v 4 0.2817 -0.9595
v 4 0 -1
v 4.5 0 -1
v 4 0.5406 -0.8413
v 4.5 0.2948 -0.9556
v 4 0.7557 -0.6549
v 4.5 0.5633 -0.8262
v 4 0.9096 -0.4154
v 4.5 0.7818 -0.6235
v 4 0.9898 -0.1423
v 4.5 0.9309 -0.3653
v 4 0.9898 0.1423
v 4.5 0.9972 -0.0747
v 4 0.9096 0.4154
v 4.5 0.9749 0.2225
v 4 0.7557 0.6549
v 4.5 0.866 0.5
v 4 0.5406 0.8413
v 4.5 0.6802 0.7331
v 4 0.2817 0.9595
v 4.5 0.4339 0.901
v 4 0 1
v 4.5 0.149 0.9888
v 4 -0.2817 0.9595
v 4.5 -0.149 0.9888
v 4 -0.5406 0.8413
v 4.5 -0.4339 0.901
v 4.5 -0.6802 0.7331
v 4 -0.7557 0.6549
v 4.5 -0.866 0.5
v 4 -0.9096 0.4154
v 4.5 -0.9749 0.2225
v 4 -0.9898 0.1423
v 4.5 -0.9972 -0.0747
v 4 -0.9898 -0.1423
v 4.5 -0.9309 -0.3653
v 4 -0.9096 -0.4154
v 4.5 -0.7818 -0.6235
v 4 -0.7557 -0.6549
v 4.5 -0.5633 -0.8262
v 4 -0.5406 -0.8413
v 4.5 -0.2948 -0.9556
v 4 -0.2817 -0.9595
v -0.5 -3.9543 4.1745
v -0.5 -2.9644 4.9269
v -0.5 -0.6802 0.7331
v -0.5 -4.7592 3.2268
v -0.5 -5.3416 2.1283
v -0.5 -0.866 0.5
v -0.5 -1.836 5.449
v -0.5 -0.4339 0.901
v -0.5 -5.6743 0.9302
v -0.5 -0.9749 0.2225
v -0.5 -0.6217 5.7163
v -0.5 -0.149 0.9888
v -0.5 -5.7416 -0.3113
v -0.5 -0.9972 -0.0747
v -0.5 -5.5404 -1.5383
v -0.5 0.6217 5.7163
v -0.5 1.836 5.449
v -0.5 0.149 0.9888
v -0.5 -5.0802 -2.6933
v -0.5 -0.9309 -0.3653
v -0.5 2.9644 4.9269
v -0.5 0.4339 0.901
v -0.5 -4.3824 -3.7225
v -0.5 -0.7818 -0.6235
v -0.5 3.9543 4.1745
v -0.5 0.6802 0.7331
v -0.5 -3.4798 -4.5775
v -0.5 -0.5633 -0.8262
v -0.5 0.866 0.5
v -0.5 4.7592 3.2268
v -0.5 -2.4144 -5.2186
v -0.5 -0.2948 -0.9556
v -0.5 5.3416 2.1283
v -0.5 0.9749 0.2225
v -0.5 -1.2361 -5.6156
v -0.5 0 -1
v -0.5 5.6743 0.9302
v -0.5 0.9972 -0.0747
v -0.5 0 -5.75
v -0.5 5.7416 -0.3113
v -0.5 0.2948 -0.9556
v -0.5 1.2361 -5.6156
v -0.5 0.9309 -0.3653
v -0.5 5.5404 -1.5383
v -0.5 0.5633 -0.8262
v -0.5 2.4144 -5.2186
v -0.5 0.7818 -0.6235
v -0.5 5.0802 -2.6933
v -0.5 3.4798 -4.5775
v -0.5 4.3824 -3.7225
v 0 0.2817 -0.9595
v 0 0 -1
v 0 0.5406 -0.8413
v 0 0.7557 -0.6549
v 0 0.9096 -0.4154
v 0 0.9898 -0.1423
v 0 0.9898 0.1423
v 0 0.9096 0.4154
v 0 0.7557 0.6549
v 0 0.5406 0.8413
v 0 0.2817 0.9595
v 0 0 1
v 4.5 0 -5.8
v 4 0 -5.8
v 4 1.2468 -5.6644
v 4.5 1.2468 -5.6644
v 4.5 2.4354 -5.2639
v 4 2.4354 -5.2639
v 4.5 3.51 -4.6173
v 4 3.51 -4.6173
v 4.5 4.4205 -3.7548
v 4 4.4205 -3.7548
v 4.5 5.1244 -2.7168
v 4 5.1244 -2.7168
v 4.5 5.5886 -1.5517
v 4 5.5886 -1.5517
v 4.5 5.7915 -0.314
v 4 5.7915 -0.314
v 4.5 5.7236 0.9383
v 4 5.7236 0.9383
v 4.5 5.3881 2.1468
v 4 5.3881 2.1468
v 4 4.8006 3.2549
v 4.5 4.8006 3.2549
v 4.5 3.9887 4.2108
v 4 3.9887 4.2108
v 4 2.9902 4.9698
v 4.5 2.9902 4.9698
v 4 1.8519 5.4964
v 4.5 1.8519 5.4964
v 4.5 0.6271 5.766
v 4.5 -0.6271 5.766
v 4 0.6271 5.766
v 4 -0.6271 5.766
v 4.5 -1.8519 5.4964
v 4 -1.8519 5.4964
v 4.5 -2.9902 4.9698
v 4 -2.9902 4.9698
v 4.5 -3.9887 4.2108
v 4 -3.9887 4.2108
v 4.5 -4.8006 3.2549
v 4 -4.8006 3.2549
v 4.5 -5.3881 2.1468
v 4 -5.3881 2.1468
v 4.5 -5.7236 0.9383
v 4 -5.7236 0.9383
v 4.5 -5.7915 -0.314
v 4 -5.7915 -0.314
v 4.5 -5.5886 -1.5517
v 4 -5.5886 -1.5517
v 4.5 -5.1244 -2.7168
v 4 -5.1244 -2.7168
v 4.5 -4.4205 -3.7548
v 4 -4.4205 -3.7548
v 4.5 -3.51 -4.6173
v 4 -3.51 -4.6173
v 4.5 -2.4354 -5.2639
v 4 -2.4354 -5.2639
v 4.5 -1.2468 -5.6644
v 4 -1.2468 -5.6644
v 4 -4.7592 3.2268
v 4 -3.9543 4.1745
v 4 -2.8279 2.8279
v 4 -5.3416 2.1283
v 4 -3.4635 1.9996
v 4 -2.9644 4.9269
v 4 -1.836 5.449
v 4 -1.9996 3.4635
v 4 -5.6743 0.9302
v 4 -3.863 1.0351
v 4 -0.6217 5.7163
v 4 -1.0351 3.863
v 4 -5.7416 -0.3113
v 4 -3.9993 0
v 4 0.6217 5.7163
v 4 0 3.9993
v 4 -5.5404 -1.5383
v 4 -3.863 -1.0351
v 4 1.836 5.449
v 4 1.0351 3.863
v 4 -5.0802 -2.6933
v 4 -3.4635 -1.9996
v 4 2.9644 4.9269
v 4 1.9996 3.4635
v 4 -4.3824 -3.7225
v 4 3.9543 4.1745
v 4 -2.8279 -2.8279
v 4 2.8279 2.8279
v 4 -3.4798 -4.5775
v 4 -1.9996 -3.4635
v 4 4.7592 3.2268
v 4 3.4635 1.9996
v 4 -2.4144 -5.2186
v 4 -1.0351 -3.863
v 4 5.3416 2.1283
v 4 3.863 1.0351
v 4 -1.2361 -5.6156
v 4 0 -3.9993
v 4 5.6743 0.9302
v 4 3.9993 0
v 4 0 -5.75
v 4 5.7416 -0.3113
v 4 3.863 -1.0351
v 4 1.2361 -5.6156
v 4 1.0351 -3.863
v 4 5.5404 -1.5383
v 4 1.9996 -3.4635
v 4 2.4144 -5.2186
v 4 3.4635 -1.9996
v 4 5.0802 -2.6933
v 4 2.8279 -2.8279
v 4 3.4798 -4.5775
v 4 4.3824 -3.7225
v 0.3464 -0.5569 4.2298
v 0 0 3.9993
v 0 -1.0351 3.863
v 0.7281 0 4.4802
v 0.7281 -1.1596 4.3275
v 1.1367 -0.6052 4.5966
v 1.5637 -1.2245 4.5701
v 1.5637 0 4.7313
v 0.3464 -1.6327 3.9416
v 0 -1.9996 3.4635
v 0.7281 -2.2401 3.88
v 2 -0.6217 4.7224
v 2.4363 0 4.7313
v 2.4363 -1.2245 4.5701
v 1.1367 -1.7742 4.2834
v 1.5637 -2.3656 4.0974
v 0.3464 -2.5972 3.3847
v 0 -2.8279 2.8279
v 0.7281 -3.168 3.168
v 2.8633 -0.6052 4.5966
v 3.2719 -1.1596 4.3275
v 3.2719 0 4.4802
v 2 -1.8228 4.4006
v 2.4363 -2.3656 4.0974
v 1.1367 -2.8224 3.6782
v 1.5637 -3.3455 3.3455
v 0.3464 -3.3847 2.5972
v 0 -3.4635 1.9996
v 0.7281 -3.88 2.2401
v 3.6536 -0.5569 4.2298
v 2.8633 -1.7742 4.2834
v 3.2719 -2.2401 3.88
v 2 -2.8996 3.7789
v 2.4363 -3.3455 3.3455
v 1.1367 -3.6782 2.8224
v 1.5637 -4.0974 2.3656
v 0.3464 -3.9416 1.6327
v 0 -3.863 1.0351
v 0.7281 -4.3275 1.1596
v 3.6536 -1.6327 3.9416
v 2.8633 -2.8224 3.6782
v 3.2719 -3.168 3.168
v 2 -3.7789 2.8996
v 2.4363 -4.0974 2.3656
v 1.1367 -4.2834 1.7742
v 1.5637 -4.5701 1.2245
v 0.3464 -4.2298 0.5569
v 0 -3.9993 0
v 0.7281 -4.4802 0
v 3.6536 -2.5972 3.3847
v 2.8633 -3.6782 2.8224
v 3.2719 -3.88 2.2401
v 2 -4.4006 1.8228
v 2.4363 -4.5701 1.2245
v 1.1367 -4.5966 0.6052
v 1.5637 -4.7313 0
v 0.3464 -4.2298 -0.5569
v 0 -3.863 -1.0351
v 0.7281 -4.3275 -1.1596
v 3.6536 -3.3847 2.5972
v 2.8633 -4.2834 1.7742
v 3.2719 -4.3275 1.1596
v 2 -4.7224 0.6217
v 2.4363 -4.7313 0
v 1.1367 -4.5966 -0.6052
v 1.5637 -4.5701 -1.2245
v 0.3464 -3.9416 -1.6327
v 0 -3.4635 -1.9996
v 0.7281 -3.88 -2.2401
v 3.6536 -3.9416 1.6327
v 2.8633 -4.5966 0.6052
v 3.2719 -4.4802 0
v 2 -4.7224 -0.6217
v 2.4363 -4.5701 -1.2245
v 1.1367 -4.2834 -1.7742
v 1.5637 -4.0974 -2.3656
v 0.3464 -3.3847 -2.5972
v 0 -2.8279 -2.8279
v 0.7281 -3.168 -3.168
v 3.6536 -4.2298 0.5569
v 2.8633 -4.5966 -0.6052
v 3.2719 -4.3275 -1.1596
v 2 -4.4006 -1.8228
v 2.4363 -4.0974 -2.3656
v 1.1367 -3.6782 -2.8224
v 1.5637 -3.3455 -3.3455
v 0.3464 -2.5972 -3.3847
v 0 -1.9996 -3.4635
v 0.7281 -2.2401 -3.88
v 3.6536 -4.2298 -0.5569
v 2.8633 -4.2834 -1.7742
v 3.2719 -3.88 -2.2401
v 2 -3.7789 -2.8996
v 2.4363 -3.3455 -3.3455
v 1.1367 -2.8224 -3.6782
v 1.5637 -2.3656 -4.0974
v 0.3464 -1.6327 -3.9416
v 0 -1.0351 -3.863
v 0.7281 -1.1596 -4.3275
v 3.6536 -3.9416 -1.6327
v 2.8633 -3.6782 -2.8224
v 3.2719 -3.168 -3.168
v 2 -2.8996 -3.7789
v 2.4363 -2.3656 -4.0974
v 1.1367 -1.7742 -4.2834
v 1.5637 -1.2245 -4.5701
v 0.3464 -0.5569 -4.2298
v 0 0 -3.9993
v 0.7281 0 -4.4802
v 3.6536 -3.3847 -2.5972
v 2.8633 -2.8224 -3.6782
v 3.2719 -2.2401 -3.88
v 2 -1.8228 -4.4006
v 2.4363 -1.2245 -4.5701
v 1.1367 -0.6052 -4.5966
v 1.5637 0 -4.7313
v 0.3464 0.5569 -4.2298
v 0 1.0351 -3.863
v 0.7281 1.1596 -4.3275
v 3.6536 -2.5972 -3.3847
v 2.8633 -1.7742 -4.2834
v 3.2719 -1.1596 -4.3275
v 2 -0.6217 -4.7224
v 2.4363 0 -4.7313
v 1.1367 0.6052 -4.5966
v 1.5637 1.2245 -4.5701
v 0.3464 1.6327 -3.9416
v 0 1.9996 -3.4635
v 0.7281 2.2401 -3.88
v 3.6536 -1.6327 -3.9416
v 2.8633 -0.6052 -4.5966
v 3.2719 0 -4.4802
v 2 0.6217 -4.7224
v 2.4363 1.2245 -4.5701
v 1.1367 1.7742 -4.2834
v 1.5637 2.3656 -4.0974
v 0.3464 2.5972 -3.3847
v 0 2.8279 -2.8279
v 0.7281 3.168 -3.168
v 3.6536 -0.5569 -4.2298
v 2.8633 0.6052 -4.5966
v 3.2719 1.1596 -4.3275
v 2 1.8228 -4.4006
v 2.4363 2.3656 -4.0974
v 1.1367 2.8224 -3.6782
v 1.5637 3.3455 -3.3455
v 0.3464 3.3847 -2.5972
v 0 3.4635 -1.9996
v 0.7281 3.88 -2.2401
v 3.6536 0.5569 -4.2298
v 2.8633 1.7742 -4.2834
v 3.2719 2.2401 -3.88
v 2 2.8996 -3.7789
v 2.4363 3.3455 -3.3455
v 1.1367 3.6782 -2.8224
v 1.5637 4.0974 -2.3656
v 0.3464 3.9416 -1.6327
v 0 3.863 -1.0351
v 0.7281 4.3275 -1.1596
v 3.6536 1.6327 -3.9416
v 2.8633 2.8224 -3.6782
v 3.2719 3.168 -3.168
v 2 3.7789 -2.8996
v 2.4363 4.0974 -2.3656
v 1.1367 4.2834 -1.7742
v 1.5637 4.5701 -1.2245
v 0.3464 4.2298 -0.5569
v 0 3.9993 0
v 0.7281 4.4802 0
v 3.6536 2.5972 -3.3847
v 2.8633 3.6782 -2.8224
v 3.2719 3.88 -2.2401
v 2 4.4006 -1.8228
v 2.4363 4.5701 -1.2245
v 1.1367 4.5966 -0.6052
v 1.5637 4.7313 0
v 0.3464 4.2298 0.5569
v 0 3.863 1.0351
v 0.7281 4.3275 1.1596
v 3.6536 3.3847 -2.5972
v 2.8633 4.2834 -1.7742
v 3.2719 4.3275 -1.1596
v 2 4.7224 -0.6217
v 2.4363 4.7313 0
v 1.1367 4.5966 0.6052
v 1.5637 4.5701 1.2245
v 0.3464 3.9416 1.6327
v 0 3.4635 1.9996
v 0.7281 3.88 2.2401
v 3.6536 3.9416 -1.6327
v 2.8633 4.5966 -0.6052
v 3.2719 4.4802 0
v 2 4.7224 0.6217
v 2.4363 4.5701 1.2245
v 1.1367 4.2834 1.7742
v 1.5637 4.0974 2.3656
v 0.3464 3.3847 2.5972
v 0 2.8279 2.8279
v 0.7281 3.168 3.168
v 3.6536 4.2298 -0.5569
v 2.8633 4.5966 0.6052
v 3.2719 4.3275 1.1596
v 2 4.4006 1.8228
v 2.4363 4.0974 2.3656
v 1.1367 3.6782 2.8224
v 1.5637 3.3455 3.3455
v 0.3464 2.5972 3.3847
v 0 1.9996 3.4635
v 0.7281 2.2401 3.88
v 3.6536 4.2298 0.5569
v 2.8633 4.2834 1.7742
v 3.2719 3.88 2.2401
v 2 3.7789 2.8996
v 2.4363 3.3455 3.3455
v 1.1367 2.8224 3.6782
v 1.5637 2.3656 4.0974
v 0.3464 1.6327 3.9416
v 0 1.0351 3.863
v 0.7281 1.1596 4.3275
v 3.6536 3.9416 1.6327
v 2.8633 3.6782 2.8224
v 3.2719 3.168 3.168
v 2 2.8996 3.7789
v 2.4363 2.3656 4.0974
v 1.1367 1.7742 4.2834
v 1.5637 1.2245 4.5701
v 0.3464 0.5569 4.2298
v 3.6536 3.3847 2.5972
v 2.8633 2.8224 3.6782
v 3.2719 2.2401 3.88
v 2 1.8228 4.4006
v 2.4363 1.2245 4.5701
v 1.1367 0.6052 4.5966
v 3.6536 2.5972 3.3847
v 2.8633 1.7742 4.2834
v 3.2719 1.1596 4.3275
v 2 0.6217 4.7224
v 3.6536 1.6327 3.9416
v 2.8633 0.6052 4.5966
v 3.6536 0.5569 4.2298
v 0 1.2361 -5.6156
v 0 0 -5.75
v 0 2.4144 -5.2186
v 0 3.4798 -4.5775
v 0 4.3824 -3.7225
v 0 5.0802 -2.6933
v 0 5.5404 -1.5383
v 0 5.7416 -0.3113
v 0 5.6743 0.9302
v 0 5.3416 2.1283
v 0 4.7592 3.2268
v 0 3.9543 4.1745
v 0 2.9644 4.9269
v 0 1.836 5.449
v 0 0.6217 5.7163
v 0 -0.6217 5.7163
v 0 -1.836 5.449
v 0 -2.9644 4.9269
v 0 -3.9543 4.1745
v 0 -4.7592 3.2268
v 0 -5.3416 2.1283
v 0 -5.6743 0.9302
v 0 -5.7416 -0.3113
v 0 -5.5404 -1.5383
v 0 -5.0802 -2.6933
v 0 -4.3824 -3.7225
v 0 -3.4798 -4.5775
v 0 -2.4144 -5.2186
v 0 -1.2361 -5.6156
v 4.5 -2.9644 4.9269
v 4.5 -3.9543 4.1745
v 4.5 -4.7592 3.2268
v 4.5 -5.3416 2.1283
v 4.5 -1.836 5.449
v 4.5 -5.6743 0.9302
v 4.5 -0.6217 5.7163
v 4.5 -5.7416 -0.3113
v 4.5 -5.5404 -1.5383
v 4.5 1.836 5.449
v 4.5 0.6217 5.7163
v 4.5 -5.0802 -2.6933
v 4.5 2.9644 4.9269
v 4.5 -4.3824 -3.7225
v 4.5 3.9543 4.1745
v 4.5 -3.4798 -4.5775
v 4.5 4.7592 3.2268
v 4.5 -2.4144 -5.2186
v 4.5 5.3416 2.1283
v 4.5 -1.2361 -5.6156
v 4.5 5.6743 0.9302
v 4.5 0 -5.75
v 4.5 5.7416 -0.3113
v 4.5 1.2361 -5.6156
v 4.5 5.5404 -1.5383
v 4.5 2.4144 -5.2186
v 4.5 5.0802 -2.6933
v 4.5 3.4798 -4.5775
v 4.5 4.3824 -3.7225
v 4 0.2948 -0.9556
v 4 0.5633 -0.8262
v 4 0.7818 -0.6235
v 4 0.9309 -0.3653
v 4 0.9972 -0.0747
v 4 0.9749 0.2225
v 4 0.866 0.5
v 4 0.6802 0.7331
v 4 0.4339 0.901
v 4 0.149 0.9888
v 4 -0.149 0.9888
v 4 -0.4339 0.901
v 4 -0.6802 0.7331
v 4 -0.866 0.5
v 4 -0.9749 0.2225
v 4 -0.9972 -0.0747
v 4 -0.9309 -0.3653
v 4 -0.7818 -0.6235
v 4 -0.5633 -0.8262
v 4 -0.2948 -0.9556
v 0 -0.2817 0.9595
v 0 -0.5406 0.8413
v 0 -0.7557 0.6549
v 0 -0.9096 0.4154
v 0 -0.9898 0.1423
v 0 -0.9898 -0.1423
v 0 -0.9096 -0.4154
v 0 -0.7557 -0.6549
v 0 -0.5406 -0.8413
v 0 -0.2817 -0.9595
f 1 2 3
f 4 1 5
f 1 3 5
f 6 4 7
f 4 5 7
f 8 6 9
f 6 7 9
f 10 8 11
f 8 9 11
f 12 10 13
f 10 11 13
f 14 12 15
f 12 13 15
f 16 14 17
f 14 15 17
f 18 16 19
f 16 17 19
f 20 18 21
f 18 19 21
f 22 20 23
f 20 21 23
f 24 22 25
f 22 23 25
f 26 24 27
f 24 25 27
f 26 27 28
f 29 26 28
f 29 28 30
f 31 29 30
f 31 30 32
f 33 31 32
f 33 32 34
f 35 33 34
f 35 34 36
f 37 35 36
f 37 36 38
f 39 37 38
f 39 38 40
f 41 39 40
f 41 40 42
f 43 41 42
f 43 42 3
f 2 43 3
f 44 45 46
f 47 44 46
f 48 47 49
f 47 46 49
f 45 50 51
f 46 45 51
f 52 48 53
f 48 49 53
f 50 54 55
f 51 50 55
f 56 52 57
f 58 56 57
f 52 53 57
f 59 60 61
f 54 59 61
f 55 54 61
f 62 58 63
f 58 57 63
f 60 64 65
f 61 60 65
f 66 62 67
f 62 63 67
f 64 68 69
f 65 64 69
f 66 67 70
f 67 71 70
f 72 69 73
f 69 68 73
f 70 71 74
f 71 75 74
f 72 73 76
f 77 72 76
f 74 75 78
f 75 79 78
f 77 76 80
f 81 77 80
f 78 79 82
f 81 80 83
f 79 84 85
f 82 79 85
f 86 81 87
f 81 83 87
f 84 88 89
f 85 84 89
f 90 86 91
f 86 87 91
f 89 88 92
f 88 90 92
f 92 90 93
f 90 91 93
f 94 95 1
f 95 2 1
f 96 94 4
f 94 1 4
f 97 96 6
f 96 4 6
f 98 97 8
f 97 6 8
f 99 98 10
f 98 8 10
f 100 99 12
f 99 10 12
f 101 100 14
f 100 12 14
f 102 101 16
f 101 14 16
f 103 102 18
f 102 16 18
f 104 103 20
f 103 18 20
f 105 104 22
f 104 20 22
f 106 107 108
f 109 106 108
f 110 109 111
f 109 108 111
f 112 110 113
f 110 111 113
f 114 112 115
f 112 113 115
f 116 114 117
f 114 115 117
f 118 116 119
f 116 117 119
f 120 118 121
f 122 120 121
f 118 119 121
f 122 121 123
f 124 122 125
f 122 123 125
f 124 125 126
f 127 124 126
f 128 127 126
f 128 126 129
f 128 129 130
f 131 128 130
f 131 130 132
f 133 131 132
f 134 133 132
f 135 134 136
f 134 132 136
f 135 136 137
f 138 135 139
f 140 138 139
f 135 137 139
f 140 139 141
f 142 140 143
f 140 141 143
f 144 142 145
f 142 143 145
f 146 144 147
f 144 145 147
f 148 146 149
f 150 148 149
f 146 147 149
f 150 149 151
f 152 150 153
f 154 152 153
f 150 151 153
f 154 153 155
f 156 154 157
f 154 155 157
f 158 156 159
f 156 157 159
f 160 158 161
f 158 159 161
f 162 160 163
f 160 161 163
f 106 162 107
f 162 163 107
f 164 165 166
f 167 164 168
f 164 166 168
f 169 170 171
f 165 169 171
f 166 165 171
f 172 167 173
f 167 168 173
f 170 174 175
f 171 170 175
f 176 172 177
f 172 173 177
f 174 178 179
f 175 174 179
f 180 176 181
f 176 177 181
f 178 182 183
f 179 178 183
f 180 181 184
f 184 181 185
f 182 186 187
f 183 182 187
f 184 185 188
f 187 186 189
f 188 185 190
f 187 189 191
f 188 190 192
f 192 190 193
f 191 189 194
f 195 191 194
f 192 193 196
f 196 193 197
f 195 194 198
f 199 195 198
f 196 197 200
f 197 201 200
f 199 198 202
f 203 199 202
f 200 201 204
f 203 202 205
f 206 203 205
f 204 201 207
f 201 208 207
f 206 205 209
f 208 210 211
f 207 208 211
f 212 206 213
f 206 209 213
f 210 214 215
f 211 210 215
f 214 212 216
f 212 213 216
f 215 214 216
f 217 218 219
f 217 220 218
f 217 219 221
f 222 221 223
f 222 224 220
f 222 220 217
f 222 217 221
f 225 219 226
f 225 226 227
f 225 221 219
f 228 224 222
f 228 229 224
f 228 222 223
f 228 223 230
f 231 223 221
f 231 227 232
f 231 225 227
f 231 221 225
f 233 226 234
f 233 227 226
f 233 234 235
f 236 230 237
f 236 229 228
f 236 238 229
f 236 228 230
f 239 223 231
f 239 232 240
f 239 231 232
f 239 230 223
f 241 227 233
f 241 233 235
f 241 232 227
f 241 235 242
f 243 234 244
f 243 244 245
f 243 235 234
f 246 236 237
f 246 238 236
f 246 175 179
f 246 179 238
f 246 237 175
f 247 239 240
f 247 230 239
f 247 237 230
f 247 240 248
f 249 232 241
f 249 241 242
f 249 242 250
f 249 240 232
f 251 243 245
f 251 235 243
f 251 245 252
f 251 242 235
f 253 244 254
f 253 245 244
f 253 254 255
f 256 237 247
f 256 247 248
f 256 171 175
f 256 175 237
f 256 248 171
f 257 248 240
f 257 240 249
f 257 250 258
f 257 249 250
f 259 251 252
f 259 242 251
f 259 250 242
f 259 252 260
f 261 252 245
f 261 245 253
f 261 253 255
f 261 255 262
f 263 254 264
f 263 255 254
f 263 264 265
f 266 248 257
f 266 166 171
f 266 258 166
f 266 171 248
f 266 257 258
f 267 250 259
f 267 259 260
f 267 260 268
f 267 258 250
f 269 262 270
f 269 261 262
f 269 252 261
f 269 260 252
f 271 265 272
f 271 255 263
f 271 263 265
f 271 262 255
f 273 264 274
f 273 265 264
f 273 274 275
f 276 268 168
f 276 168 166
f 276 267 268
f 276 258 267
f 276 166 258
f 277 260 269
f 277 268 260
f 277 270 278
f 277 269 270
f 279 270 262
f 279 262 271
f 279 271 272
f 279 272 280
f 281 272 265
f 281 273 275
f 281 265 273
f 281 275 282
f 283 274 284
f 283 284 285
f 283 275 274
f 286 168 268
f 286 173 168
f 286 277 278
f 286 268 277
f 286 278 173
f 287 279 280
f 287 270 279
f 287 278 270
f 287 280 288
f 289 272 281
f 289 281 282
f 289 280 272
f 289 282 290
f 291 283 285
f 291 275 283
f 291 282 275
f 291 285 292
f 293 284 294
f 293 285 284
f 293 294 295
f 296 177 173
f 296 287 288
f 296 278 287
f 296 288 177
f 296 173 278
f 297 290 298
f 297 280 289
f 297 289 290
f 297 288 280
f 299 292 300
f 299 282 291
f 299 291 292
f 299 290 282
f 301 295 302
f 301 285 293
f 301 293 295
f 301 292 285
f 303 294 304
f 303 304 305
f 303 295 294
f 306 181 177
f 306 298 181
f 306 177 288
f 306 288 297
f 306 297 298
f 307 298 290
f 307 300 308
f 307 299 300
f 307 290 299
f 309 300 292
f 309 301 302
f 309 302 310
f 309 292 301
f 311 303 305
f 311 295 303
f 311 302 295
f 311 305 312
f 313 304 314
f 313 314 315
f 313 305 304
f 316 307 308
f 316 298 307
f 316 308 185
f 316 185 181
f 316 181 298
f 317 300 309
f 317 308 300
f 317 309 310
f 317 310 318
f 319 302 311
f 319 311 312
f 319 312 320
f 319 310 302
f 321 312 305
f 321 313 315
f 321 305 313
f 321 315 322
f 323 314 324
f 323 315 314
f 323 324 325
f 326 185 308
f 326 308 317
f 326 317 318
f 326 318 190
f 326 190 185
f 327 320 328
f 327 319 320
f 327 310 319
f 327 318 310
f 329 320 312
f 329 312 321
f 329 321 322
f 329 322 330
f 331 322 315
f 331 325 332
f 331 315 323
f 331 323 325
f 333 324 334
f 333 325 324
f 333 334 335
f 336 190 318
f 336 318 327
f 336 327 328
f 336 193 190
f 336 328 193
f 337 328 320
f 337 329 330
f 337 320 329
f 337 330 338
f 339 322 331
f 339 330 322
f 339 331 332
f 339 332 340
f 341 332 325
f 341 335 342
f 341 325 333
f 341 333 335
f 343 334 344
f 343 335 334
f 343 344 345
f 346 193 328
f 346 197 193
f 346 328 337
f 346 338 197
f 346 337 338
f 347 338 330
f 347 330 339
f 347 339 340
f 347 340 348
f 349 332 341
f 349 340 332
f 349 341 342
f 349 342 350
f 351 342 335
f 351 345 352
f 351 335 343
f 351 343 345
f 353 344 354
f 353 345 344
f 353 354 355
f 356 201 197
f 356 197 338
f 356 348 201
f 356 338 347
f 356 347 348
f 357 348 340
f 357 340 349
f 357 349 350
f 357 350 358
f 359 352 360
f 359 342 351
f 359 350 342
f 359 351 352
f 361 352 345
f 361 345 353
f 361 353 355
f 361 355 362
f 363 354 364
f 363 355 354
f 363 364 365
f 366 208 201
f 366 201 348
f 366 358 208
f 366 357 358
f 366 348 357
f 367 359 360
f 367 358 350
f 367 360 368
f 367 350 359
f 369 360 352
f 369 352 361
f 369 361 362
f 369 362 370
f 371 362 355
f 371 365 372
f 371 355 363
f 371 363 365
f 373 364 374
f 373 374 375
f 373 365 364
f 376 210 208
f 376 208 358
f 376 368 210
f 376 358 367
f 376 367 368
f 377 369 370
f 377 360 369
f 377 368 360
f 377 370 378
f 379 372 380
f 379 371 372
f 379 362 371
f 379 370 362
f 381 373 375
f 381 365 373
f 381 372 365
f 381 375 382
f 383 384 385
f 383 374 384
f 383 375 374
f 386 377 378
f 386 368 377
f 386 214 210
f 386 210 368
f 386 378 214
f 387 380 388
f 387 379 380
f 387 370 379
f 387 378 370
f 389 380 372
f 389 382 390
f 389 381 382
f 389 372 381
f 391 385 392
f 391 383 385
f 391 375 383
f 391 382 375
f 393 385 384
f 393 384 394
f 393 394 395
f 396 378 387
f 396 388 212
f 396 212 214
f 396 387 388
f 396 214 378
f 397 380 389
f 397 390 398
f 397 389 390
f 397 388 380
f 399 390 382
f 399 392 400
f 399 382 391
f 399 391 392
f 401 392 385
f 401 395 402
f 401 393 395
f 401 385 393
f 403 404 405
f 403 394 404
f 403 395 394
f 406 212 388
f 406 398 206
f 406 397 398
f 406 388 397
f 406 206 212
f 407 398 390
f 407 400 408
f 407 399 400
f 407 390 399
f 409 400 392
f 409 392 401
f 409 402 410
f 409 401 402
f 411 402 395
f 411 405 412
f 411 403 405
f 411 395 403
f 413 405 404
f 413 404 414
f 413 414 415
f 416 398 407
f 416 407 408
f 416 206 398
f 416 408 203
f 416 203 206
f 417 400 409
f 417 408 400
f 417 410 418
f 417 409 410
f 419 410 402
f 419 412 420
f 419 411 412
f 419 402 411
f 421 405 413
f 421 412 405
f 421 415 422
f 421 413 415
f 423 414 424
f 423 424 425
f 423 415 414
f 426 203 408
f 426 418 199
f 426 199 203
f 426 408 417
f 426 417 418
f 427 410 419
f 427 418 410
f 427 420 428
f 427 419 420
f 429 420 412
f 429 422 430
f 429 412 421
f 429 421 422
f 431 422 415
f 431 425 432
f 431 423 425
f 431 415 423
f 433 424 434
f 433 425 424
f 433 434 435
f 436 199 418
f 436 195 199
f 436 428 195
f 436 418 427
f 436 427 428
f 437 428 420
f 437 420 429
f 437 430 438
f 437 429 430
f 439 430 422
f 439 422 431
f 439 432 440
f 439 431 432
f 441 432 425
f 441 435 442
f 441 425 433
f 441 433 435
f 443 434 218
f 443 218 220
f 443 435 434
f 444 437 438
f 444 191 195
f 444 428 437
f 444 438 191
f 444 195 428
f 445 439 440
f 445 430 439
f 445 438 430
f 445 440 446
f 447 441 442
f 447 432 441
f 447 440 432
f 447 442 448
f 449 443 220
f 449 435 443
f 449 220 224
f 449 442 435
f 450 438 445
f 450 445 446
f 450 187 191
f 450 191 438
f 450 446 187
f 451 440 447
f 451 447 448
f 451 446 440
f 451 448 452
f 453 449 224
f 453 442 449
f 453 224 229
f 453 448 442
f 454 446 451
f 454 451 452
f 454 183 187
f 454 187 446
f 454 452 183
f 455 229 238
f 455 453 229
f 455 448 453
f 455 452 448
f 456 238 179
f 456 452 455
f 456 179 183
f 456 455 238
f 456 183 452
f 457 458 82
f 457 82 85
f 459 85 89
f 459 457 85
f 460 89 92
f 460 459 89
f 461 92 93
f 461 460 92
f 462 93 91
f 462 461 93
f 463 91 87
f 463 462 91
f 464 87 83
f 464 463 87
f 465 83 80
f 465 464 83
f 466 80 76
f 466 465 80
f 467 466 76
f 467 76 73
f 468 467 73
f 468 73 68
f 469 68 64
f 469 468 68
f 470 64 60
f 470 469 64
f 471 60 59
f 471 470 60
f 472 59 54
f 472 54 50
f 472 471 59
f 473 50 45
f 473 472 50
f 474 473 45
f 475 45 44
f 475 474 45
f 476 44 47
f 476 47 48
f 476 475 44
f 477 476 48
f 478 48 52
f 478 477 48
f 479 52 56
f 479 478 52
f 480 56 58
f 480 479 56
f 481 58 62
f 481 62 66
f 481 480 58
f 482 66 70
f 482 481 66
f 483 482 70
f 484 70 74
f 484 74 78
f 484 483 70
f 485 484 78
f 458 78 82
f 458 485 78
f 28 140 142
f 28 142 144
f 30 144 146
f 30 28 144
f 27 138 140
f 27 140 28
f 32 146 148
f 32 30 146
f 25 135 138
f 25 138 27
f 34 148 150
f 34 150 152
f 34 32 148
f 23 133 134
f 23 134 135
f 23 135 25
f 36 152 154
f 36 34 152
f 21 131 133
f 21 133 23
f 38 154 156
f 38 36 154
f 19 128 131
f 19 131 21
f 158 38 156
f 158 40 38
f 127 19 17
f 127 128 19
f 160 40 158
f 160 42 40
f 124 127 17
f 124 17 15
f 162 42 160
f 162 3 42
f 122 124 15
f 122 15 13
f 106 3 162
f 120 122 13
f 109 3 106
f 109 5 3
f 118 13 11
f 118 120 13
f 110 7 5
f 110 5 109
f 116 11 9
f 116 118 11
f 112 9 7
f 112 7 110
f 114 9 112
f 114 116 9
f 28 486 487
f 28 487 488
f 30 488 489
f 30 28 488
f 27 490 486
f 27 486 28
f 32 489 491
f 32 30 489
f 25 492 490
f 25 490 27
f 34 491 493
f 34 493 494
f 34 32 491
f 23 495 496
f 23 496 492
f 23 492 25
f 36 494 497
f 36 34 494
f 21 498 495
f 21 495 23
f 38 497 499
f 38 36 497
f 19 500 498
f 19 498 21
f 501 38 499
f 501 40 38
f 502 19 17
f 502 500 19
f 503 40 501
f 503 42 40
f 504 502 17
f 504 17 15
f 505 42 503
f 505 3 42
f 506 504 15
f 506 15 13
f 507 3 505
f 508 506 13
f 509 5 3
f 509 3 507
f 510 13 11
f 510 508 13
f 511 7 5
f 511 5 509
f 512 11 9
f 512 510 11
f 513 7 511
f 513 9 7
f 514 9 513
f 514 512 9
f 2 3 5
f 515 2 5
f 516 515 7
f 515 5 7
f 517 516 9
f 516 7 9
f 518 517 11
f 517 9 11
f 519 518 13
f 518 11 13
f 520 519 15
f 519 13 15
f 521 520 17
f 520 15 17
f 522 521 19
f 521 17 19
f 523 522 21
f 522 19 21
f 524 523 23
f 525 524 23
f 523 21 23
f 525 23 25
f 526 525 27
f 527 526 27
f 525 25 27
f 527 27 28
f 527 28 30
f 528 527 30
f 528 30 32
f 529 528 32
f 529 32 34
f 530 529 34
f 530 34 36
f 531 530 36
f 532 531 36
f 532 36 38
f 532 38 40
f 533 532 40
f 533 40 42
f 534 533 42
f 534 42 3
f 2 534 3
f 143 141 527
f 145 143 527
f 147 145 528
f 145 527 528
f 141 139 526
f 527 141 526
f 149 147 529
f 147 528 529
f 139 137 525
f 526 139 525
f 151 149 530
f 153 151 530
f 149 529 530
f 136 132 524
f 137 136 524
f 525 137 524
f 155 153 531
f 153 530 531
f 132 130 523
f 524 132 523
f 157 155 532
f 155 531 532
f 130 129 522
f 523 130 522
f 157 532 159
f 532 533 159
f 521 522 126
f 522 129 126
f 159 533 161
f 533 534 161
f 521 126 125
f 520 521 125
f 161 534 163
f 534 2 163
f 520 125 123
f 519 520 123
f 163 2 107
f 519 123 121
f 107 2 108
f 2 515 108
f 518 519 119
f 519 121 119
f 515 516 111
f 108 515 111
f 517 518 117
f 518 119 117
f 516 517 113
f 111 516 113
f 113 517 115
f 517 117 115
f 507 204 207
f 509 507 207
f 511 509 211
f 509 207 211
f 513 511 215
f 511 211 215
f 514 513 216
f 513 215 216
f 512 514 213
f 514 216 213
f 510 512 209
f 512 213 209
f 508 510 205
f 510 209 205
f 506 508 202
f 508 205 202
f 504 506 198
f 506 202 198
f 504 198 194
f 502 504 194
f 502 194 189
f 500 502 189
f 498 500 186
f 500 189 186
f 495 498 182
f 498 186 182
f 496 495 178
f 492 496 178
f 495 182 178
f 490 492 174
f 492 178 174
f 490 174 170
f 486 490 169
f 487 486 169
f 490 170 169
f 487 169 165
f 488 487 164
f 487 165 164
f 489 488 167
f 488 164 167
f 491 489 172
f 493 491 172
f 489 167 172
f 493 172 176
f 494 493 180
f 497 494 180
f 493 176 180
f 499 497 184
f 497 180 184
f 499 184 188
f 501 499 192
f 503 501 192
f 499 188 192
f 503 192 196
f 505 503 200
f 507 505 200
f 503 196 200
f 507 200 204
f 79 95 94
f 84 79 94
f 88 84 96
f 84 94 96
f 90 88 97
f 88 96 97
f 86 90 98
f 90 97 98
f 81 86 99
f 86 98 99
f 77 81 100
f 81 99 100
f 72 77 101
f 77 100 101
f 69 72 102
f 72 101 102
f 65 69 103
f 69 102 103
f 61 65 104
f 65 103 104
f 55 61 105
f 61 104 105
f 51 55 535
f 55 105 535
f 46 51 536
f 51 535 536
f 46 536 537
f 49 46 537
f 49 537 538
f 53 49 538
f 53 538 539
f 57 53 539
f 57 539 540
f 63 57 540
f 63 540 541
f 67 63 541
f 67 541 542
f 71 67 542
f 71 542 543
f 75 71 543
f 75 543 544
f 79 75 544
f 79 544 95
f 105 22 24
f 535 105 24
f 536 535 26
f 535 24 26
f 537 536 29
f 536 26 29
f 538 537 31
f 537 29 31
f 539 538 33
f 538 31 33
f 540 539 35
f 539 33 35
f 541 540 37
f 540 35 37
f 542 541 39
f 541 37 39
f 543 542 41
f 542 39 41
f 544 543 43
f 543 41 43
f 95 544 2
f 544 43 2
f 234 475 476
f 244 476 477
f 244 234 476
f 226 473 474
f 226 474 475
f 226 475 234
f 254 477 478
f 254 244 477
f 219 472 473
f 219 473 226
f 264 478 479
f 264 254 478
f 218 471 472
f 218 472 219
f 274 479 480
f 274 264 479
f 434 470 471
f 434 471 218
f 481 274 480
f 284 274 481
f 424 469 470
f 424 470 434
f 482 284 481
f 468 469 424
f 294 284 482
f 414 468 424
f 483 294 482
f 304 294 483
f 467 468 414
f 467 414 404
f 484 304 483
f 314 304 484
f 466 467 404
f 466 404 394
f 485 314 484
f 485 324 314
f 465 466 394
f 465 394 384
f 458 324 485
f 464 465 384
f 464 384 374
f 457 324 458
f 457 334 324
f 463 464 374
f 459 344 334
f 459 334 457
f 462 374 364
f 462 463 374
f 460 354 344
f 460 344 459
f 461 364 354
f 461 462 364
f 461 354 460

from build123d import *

# Parameters (mm, degrees)
SKETCH6_R           = 5.75
BOSS_EXTRUDE4_DEPTH = 0.5
SKETCH7_W           = 4
SKETCH7_H           = 2.999254163
SKETCH21_R          = 5.8
BOSS_EXTRUDE5_DEPTH = 0.5
SKETCH22_R          = 1
CUT_EXTRUDE1_DEPTH  = 10.606247967


with BuildPart() as part:
    # Sketch6 → Boss-Extrude4 (new body)
    with BuildSketch(Plane(origin=(0, 0, 0), x_dir=(0, 0, -1), z_dir=(1, 0, 0))):
        Circle(SKETCH6_R)
    boss_extrude4 = extrude(amount=-BOSS_EXTRUDE4_DEPTH)

    # Sketch7 → Revolve1 (revolve)
    with BuildSketch(Plane(origin=(0, 0, 0), x_dir=(1, 0, 0), z_dir=(0, 1, 0))):
        with Locations((2, -2.499627081)):
            Rectangle(SKETCH7_W, SKETCH7_H)
        with BuildLine():
            Line((4, -3.999254163), (0, -3.999254163))
            ThreePointArc((0, -3.999254163), (2, -4.763186185), (4, -3.999254163))
        make_face()
    revolve(axis=Axis((0, 0, 0), (1, 0, 0)))

    # Mirror1: Boss-Extrude4 across plane
    add(boss_extrude4.mirror(Plane(origin=(2, 0, 0), x_dir=(0, 0, 1), z_dir=(1, 0, 0))))


with BuildPart() as body_2:
    # Sketch21 → Boss-Extrude5 (new body)
    with BuildSketch(Plane(origin=(4, 0, 0), x_dir=(0, 0, -1), z_dir=(1, 0, 0))):
        Circle(SKETCH21_R)
    extrude(amount=BOSS_EXTRUDE5_DEPTH)


with BuildPart() as cut_extrude1_tool:
    # Sketch22 → Cut-Extrude1 (new, through all)
    with BuildSketch(Plane(origin=(4.5, 0, 0), x_dir=(0, 0, -1), z_dir=(1, 0, 0))):
        Circle(SKETCH22_R)
    extrude(amount=-CUT_EXTRUDE1_DEPTH)


with BuildPart() as part_1:
    add(part.part)

    # Cut-Extrude1: cut by cut_extrude1_tool
    add(cut_extrude1_tool.part, mode=Mode.SUBTRACT)


with BuildPart() as body_2_1:
    add(body_2.part)

    # Cut-Extrude1: cut by cut_extrude1_tool
    add(cut_extrude1_tool.part, mode=Mode.SUBTRACT)


solid = Compound([part_1.part, body_2_1.part])
